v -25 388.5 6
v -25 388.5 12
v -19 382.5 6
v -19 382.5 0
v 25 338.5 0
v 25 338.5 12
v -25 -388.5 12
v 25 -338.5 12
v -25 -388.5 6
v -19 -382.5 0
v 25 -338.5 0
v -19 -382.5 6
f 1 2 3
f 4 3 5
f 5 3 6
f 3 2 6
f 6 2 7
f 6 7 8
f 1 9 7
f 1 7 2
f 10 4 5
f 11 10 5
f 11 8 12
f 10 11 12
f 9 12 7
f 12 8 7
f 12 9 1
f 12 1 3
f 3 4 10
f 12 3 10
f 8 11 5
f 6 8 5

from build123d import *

# Parameters (mm, degrees)
F0_W     = 50
F0_H     = 777
F1_DEPTH = 12
F2_W     = 6
F2_H     = 777
F3_DEPTH = 6
F5_DEPTH = 12
F7_DEPTH = 12


with BuildPart() as f1:
    # F0 (on Top) → F1 (new body)
    with BuildSketch(Plane.XY):
        Rectangle(F0_W, F0_H)
    extrude(amount=F1_DEPTH)

    # F2 (on face) → F3 (cut)
    with BuildSketch(Plane(origin=(0, 0, 0), x_dir=(1, 0, 0), z_dir=(0, 0, -1))):
        with Locations((-22, 0)):
            Rectangle(F2_W, F2_H)
    extrude(amount=-F3_DEPTH, mode=Mode.SUBTRACT)

    # F4 (on face) → F5 (cut, through all)
    with BuildSketch(Plane.XY.offset(12)):
        Polygon((25, -338.5), (-25, -388.5), (25, -388.5), align=None)
    extrude(amount=-F5_DEPTH, mode=Mode.SUBTRACT)

    # F6 (on face) → F7 (cut, through all)
    with BuildSketch(Plane.XY.offset(12)):
        Polygon((25, 388.5), (-25, 388.5), (25, 338.5), align=None)
    extrude(amount=-F7_DEPTH, mode=Mode.SUBTRACT)


solid = f1.part
